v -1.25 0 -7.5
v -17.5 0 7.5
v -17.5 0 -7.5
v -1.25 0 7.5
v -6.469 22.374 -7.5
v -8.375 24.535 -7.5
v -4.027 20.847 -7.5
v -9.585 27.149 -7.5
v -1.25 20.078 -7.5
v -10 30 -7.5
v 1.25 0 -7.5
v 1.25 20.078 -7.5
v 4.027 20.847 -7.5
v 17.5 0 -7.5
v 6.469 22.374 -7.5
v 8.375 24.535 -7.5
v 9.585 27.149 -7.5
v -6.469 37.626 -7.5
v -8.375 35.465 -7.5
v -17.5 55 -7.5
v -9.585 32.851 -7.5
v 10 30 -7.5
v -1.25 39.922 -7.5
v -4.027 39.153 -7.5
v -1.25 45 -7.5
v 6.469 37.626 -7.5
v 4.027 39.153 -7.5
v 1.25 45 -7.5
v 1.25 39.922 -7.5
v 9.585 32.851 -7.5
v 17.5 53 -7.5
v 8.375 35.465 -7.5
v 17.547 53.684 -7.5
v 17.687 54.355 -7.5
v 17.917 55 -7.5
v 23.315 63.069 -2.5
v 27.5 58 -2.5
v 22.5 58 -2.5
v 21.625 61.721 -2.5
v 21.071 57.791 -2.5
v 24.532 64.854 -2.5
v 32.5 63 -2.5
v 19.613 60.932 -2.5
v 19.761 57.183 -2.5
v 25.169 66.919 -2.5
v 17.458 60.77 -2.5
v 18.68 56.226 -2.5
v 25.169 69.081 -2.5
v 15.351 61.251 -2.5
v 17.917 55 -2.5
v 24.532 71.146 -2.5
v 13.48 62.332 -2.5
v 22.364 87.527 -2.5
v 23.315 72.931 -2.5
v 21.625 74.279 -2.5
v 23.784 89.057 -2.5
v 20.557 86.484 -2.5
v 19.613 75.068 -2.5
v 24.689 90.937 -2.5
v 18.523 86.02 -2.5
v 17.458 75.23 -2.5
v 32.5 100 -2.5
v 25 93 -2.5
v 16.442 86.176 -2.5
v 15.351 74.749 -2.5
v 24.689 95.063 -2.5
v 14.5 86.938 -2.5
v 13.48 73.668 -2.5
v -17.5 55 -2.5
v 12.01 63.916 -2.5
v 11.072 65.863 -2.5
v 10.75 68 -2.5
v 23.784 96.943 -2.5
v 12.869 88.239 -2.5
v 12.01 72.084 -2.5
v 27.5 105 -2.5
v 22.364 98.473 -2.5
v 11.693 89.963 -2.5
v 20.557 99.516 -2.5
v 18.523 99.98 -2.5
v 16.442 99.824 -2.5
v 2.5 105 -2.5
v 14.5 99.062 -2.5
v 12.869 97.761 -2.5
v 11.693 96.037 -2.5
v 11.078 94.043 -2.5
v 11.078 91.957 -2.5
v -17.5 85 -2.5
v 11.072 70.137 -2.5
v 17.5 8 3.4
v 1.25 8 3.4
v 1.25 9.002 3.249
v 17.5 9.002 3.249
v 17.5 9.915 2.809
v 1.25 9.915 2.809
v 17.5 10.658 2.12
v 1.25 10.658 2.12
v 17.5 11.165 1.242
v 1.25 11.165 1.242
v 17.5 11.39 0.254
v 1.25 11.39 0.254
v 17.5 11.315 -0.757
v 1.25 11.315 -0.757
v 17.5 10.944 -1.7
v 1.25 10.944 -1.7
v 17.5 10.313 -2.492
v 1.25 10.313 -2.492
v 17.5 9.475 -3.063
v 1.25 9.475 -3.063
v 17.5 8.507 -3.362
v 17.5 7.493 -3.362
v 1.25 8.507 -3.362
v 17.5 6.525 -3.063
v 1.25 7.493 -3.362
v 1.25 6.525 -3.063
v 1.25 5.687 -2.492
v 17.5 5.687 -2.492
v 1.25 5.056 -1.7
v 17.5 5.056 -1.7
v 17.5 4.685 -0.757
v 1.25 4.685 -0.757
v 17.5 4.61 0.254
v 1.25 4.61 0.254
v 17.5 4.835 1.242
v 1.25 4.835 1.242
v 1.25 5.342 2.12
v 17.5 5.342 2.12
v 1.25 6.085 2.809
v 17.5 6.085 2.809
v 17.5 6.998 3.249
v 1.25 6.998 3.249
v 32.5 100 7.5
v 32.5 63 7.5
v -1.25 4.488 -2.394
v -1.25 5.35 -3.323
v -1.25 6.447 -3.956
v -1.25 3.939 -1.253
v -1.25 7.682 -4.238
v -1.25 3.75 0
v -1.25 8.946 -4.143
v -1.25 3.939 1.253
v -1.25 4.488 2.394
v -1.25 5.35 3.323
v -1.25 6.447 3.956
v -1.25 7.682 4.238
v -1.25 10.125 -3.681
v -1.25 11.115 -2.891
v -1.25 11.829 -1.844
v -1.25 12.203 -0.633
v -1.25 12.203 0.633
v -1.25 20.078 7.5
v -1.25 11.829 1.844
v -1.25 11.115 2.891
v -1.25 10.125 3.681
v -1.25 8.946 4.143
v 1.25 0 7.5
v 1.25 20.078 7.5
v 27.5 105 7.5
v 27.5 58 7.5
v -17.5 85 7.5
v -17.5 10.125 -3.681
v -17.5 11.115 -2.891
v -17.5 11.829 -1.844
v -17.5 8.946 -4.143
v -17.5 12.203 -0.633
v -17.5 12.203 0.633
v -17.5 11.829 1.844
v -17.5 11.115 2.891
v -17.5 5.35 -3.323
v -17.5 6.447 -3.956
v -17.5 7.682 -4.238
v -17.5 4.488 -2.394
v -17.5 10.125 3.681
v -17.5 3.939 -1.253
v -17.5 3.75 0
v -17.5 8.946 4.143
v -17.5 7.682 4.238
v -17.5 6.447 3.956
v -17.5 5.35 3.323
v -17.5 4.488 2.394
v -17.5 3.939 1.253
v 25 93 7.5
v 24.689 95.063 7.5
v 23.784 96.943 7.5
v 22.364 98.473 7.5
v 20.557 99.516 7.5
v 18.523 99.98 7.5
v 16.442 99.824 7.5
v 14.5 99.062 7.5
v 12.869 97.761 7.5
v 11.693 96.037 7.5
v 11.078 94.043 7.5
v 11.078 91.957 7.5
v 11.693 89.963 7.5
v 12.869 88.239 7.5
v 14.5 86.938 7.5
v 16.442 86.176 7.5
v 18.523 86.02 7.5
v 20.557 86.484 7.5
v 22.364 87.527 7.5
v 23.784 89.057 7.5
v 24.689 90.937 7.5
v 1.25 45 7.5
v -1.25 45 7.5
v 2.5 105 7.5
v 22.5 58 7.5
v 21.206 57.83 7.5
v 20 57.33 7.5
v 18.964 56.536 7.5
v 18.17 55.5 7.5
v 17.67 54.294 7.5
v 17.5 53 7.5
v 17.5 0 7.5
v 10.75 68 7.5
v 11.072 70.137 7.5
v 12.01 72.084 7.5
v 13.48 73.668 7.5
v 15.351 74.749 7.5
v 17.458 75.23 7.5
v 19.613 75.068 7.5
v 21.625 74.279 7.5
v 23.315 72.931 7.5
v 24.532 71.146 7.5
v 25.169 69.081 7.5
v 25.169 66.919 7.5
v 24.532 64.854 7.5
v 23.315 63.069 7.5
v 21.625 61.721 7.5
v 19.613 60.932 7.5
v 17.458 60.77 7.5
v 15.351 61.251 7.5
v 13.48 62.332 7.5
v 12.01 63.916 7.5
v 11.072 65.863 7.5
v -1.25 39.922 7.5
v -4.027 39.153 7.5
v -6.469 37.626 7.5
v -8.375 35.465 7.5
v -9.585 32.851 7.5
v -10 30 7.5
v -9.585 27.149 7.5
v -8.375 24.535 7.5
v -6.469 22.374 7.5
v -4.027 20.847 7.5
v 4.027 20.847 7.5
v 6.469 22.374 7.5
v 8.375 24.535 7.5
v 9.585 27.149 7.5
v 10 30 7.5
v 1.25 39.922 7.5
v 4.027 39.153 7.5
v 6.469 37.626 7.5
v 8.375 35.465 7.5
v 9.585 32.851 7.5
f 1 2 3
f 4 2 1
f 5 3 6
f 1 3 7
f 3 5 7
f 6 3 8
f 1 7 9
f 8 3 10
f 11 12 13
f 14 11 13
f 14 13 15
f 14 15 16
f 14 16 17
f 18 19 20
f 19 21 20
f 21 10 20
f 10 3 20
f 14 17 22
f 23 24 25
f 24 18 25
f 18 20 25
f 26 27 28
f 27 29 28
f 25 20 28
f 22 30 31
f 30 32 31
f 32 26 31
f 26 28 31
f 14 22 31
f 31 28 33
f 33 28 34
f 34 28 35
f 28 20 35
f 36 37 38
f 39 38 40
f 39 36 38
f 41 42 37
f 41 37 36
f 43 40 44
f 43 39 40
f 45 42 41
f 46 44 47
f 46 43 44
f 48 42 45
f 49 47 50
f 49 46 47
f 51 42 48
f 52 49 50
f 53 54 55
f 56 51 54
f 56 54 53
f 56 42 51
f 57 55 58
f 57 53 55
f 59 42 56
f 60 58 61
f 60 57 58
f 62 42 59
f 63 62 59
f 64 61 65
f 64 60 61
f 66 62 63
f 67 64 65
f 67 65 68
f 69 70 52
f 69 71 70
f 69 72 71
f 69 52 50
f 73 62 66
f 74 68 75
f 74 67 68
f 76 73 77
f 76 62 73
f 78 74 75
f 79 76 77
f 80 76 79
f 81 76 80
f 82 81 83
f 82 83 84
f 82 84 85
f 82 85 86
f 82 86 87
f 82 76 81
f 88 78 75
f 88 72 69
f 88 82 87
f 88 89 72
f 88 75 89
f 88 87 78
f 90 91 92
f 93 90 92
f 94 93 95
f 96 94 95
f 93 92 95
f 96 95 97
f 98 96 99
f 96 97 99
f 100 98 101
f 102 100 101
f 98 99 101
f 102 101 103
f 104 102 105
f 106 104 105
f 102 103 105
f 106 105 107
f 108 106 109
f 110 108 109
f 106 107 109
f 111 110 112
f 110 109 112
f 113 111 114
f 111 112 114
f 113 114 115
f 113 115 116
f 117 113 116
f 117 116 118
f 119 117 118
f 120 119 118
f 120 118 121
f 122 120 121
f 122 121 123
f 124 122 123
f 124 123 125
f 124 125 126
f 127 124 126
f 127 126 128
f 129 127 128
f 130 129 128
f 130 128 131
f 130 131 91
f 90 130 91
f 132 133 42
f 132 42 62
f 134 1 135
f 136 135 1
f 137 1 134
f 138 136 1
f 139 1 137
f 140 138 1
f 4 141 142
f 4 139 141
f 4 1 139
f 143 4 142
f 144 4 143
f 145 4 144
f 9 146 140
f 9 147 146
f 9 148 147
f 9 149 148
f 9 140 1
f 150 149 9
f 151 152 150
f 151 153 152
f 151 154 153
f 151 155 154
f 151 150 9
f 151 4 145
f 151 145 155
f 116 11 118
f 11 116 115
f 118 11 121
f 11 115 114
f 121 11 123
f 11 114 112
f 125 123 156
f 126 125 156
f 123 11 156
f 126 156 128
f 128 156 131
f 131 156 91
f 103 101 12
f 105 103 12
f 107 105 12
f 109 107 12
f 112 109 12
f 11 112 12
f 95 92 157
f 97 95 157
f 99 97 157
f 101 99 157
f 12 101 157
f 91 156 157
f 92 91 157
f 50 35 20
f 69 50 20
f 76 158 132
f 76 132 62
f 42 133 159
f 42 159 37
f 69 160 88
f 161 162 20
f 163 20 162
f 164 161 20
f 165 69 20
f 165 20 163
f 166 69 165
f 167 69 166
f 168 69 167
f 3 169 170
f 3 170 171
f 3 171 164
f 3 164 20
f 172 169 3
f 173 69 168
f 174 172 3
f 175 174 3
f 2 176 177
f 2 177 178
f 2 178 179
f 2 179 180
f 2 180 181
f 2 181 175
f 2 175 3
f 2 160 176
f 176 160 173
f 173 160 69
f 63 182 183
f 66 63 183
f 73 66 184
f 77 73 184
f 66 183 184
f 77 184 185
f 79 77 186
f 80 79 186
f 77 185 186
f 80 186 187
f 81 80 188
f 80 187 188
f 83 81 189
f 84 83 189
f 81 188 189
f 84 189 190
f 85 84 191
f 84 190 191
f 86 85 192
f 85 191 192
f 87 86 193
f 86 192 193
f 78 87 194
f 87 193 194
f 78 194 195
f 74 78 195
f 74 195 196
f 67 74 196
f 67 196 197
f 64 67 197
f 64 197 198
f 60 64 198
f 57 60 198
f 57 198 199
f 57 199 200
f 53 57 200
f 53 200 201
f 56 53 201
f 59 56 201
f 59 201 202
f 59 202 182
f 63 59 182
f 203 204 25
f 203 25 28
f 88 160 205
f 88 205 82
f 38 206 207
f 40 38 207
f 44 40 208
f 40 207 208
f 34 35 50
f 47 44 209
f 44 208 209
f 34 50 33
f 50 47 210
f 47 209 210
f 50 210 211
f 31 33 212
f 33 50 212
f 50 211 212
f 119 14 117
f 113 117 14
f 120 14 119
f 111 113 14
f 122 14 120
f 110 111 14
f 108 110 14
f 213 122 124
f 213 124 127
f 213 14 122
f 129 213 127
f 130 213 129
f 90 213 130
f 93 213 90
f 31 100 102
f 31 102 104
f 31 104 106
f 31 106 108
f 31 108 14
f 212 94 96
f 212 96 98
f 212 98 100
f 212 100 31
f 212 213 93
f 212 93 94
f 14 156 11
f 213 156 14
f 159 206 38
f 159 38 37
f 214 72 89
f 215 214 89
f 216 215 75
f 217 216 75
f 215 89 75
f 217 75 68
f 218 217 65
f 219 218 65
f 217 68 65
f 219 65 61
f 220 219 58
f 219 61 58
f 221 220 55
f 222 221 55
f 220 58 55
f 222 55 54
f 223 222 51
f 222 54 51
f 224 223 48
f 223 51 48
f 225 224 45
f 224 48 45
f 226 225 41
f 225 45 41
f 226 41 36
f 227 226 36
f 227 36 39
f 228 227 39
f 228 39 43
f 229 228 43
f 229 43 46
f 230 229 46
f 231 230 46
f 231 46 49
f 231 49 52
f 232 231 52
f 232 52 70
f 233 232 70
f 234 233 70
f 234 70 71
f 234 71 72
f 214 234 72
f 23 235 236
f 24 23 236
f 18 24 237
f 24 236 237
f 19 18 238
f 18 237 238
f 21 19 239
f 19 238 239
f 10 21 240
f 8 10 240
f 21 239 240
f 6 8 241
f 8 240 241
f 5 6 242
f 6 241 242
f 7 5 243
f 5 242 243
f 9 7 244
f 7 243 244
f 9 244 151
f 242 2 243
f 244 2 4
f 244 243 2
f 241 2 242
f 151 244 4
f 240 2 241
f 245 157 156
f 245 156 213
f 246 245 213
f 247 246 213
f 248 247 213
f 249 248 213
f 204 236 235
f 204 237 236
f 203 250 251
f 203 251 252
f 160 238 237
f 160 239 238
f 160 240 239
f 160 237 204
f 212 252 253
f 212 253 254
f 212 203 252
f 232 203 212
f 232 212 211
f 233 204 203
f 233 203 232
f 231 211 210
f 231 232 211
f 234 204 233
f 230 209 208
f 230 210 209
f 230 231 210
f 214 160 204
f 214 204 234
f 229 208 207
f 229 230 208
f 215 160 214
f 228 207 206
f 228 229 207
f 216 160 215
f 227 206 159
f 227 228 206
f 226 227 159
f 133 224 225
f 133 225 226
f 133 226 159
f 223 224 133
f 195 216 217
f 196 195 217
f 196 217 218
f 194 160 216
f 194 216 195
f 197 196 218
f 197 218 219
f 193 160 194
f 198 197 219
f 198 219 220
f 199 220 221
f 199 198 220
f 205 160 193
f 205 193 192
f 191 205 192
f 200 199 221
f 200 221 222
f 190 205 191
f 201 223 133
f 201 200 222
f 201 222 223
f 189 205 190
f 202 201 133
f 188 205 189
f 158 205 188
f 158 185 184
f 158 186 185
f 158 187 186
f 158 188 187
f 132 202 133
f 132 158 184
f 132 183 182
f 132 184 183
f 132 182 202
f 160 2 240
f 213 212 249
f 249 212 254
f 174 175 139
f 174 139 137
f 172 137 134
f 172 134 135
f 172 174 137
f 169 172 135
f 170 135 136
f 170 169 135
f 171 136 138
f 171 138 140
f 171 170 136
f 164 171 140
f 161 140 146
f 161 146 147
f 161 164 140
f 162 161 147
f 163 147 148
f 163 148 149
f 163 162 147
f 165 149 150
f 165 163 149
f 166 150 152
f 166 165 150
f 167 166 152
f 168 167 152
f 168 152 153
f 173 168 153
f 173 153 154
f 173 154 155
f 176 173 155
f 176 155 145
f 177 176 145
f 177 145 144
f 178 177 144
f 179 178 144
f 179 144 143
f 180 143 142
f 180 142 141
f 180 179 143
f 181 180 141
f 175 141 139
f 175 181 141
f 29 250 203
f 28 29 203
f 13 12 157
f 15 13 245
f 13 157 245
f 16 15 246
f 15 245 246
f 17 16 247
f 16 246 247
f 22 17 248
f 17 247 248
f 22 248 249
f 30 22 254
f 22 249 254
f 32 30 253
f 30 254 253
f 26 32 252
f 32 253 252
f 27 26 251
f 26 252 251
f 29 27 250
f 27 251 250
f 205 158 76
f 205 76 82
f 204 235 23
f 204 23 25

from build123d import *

# Parameters (mm, degrees)
EXTRUDE_1_DEPTH     = 7.5
SKETCH_2_R          = 10
CUT_EXTRUDE_1_DEPTH = 111.933538662
SKETCH_3_W          = 2.5
SKETCH_3_H          = 45
CUT_EXTRUDE_2_DEPTH = 111.933538662
FILLET_1_R          = 5
SKETCH_4_R          = 4.25
CUT_EXTRUDE_3_DEPTH = 16.25
M8X1_25_1_D         = 6.8
SKETCH_10_R         = 7
CUT_EXTRUDE_4_DEPTH = 111.933538662
SKETCH_11_W         = 50
SKETCH_11_H         = 50
CUT_EXTRUDE_5_DEPTH = 5
CHAMFER_2_SIZE      = 5
CHAMFER_3_SIZE      = 20
SKETCH_12_R         = 7.25
CUT_EXTRUDE_6_DEPTH = 111.368700273


with BuildPart() as part:
    # 草图1 → 凸台-拉伸1 (new, symmetric)
    with BuildSketch(Plane.XY):
        Polygon((-17.5, 105), (-17.5, 0), (17.5, 0), (17.5, 58), (32.5, 58), (32.5, 105), align=None)
    extrude(amount=EXTRUDE_1_DEPTH, both=True)

    # 草图2 → 切除-拉伸1 (cut, through all)
    with BuildSketch(Plane.XY.offset(7.5)):
        with Locations((0, 30)):
            Circle(SKETCH_2_R)
    extrude(amount=-CUT_EXTRUDE_1_DEPTH, mode=Mode.SUBTRACT)

    # 草图3 → 切除-拉伸2 (cut, through all)
    with BuildSketch(Plane.XY.offset(7.5)):
        with Locations((0, 22.5)):
            Rectangle(SKETCH_3_W, SKETCH_3_H)
    extrude(amount=-CUT_EXTRUDE_2_DEPTH, mode=Mode.SUBTRACT)

    # 圆角1
    fillet_1_edges = [part.edges().sort_by_distance(p)[0] for p in [
        (17.5, 58, 0),
    ]]
    fillet(fillet_1_edges, radius=FILLET_1_R)

    # 草图4 → 切除-拉伸3 (cut)
    with BuildSketch(Plane(origin=(-17.5, 0, 0), x_dir=(0, 0, -1), z_dir=(1, 0, 0))):
        with Locations(Location((0, 8, 0), (0, 0, 270))):
            Circle(SKETCH_4_R)
    extrude(amount=CUT_EXTRUDE_3_DEPTH, mode=Mode.SUBTRACT)

    # M8x1.25 螺纹孔1 (through all)
    with Locations(Plane(origin=(17.5, 13.24526089, -0.849289526), x_dir=(0, 0, -1), z_dir=(1, 0, 0))):
        with Locations((-0.849289526, -5.24526089)):
            Hole(M8X1_25_1_D / 2)

    # 草图10 → 切除-拉伸4 (cut, through all)
    with BuildSketch(Plane.XY.offset(7.5)):
        with Locations((18, 93)):
            Circle(SKETCH_10_R)
    extrude(amount=-CUT_EXTRUDE_4_DEPTH, mode=Mode.SUBTRACT)

    # 草图11 → 切除-拉伸5 (cut)
    with BuildSketch(Plane(origin=(0, 0, -7.5), x_dir=(-1, 0, 0), z_dir=(0, 0, -1))):
        with Locations((-7.5, 80)):
            Rectangle(SKETCH_11_W, SKETCH_11_H)
    extrude(amount=-CUT_EXTRUDE_5_DEPTH, mode=Mode.SUBTRACT)

    # 倒角2
    chamfer_2_edges = [part.edges().sort_by_distance(p)[0] for p in [
        (32.5, 105, 2.5),
        (32.5, 58, 2.5),
    ]]
    chamfer(chamfer_2_edges, length=CHAMFER_2_SIZE)

    # 倒角3
    chamfer_3_edges = [part.edges().sort_by_distance(p)[0] for p in [
        (-17.5, 105, 2.5),
    ]]
    chamfer(chamfer_3_edges, length=CHAMFER_3_SIZE)

    # 草图12 → 切除-拉伸6 (cut, through all)
    with BuildSketch(Plane(origin=(0, 0, -2.5), x_dir=(-1, 0, 0), z_dir=(0, 0, -1))):
        with Locations((-18, 68)):
            Circle(SKETCH_12_R)
    extrude(amount=-CUT_EXTRUDE_6_DEPTH, mode=Mode.SUBTRACT)


solid = part.part
